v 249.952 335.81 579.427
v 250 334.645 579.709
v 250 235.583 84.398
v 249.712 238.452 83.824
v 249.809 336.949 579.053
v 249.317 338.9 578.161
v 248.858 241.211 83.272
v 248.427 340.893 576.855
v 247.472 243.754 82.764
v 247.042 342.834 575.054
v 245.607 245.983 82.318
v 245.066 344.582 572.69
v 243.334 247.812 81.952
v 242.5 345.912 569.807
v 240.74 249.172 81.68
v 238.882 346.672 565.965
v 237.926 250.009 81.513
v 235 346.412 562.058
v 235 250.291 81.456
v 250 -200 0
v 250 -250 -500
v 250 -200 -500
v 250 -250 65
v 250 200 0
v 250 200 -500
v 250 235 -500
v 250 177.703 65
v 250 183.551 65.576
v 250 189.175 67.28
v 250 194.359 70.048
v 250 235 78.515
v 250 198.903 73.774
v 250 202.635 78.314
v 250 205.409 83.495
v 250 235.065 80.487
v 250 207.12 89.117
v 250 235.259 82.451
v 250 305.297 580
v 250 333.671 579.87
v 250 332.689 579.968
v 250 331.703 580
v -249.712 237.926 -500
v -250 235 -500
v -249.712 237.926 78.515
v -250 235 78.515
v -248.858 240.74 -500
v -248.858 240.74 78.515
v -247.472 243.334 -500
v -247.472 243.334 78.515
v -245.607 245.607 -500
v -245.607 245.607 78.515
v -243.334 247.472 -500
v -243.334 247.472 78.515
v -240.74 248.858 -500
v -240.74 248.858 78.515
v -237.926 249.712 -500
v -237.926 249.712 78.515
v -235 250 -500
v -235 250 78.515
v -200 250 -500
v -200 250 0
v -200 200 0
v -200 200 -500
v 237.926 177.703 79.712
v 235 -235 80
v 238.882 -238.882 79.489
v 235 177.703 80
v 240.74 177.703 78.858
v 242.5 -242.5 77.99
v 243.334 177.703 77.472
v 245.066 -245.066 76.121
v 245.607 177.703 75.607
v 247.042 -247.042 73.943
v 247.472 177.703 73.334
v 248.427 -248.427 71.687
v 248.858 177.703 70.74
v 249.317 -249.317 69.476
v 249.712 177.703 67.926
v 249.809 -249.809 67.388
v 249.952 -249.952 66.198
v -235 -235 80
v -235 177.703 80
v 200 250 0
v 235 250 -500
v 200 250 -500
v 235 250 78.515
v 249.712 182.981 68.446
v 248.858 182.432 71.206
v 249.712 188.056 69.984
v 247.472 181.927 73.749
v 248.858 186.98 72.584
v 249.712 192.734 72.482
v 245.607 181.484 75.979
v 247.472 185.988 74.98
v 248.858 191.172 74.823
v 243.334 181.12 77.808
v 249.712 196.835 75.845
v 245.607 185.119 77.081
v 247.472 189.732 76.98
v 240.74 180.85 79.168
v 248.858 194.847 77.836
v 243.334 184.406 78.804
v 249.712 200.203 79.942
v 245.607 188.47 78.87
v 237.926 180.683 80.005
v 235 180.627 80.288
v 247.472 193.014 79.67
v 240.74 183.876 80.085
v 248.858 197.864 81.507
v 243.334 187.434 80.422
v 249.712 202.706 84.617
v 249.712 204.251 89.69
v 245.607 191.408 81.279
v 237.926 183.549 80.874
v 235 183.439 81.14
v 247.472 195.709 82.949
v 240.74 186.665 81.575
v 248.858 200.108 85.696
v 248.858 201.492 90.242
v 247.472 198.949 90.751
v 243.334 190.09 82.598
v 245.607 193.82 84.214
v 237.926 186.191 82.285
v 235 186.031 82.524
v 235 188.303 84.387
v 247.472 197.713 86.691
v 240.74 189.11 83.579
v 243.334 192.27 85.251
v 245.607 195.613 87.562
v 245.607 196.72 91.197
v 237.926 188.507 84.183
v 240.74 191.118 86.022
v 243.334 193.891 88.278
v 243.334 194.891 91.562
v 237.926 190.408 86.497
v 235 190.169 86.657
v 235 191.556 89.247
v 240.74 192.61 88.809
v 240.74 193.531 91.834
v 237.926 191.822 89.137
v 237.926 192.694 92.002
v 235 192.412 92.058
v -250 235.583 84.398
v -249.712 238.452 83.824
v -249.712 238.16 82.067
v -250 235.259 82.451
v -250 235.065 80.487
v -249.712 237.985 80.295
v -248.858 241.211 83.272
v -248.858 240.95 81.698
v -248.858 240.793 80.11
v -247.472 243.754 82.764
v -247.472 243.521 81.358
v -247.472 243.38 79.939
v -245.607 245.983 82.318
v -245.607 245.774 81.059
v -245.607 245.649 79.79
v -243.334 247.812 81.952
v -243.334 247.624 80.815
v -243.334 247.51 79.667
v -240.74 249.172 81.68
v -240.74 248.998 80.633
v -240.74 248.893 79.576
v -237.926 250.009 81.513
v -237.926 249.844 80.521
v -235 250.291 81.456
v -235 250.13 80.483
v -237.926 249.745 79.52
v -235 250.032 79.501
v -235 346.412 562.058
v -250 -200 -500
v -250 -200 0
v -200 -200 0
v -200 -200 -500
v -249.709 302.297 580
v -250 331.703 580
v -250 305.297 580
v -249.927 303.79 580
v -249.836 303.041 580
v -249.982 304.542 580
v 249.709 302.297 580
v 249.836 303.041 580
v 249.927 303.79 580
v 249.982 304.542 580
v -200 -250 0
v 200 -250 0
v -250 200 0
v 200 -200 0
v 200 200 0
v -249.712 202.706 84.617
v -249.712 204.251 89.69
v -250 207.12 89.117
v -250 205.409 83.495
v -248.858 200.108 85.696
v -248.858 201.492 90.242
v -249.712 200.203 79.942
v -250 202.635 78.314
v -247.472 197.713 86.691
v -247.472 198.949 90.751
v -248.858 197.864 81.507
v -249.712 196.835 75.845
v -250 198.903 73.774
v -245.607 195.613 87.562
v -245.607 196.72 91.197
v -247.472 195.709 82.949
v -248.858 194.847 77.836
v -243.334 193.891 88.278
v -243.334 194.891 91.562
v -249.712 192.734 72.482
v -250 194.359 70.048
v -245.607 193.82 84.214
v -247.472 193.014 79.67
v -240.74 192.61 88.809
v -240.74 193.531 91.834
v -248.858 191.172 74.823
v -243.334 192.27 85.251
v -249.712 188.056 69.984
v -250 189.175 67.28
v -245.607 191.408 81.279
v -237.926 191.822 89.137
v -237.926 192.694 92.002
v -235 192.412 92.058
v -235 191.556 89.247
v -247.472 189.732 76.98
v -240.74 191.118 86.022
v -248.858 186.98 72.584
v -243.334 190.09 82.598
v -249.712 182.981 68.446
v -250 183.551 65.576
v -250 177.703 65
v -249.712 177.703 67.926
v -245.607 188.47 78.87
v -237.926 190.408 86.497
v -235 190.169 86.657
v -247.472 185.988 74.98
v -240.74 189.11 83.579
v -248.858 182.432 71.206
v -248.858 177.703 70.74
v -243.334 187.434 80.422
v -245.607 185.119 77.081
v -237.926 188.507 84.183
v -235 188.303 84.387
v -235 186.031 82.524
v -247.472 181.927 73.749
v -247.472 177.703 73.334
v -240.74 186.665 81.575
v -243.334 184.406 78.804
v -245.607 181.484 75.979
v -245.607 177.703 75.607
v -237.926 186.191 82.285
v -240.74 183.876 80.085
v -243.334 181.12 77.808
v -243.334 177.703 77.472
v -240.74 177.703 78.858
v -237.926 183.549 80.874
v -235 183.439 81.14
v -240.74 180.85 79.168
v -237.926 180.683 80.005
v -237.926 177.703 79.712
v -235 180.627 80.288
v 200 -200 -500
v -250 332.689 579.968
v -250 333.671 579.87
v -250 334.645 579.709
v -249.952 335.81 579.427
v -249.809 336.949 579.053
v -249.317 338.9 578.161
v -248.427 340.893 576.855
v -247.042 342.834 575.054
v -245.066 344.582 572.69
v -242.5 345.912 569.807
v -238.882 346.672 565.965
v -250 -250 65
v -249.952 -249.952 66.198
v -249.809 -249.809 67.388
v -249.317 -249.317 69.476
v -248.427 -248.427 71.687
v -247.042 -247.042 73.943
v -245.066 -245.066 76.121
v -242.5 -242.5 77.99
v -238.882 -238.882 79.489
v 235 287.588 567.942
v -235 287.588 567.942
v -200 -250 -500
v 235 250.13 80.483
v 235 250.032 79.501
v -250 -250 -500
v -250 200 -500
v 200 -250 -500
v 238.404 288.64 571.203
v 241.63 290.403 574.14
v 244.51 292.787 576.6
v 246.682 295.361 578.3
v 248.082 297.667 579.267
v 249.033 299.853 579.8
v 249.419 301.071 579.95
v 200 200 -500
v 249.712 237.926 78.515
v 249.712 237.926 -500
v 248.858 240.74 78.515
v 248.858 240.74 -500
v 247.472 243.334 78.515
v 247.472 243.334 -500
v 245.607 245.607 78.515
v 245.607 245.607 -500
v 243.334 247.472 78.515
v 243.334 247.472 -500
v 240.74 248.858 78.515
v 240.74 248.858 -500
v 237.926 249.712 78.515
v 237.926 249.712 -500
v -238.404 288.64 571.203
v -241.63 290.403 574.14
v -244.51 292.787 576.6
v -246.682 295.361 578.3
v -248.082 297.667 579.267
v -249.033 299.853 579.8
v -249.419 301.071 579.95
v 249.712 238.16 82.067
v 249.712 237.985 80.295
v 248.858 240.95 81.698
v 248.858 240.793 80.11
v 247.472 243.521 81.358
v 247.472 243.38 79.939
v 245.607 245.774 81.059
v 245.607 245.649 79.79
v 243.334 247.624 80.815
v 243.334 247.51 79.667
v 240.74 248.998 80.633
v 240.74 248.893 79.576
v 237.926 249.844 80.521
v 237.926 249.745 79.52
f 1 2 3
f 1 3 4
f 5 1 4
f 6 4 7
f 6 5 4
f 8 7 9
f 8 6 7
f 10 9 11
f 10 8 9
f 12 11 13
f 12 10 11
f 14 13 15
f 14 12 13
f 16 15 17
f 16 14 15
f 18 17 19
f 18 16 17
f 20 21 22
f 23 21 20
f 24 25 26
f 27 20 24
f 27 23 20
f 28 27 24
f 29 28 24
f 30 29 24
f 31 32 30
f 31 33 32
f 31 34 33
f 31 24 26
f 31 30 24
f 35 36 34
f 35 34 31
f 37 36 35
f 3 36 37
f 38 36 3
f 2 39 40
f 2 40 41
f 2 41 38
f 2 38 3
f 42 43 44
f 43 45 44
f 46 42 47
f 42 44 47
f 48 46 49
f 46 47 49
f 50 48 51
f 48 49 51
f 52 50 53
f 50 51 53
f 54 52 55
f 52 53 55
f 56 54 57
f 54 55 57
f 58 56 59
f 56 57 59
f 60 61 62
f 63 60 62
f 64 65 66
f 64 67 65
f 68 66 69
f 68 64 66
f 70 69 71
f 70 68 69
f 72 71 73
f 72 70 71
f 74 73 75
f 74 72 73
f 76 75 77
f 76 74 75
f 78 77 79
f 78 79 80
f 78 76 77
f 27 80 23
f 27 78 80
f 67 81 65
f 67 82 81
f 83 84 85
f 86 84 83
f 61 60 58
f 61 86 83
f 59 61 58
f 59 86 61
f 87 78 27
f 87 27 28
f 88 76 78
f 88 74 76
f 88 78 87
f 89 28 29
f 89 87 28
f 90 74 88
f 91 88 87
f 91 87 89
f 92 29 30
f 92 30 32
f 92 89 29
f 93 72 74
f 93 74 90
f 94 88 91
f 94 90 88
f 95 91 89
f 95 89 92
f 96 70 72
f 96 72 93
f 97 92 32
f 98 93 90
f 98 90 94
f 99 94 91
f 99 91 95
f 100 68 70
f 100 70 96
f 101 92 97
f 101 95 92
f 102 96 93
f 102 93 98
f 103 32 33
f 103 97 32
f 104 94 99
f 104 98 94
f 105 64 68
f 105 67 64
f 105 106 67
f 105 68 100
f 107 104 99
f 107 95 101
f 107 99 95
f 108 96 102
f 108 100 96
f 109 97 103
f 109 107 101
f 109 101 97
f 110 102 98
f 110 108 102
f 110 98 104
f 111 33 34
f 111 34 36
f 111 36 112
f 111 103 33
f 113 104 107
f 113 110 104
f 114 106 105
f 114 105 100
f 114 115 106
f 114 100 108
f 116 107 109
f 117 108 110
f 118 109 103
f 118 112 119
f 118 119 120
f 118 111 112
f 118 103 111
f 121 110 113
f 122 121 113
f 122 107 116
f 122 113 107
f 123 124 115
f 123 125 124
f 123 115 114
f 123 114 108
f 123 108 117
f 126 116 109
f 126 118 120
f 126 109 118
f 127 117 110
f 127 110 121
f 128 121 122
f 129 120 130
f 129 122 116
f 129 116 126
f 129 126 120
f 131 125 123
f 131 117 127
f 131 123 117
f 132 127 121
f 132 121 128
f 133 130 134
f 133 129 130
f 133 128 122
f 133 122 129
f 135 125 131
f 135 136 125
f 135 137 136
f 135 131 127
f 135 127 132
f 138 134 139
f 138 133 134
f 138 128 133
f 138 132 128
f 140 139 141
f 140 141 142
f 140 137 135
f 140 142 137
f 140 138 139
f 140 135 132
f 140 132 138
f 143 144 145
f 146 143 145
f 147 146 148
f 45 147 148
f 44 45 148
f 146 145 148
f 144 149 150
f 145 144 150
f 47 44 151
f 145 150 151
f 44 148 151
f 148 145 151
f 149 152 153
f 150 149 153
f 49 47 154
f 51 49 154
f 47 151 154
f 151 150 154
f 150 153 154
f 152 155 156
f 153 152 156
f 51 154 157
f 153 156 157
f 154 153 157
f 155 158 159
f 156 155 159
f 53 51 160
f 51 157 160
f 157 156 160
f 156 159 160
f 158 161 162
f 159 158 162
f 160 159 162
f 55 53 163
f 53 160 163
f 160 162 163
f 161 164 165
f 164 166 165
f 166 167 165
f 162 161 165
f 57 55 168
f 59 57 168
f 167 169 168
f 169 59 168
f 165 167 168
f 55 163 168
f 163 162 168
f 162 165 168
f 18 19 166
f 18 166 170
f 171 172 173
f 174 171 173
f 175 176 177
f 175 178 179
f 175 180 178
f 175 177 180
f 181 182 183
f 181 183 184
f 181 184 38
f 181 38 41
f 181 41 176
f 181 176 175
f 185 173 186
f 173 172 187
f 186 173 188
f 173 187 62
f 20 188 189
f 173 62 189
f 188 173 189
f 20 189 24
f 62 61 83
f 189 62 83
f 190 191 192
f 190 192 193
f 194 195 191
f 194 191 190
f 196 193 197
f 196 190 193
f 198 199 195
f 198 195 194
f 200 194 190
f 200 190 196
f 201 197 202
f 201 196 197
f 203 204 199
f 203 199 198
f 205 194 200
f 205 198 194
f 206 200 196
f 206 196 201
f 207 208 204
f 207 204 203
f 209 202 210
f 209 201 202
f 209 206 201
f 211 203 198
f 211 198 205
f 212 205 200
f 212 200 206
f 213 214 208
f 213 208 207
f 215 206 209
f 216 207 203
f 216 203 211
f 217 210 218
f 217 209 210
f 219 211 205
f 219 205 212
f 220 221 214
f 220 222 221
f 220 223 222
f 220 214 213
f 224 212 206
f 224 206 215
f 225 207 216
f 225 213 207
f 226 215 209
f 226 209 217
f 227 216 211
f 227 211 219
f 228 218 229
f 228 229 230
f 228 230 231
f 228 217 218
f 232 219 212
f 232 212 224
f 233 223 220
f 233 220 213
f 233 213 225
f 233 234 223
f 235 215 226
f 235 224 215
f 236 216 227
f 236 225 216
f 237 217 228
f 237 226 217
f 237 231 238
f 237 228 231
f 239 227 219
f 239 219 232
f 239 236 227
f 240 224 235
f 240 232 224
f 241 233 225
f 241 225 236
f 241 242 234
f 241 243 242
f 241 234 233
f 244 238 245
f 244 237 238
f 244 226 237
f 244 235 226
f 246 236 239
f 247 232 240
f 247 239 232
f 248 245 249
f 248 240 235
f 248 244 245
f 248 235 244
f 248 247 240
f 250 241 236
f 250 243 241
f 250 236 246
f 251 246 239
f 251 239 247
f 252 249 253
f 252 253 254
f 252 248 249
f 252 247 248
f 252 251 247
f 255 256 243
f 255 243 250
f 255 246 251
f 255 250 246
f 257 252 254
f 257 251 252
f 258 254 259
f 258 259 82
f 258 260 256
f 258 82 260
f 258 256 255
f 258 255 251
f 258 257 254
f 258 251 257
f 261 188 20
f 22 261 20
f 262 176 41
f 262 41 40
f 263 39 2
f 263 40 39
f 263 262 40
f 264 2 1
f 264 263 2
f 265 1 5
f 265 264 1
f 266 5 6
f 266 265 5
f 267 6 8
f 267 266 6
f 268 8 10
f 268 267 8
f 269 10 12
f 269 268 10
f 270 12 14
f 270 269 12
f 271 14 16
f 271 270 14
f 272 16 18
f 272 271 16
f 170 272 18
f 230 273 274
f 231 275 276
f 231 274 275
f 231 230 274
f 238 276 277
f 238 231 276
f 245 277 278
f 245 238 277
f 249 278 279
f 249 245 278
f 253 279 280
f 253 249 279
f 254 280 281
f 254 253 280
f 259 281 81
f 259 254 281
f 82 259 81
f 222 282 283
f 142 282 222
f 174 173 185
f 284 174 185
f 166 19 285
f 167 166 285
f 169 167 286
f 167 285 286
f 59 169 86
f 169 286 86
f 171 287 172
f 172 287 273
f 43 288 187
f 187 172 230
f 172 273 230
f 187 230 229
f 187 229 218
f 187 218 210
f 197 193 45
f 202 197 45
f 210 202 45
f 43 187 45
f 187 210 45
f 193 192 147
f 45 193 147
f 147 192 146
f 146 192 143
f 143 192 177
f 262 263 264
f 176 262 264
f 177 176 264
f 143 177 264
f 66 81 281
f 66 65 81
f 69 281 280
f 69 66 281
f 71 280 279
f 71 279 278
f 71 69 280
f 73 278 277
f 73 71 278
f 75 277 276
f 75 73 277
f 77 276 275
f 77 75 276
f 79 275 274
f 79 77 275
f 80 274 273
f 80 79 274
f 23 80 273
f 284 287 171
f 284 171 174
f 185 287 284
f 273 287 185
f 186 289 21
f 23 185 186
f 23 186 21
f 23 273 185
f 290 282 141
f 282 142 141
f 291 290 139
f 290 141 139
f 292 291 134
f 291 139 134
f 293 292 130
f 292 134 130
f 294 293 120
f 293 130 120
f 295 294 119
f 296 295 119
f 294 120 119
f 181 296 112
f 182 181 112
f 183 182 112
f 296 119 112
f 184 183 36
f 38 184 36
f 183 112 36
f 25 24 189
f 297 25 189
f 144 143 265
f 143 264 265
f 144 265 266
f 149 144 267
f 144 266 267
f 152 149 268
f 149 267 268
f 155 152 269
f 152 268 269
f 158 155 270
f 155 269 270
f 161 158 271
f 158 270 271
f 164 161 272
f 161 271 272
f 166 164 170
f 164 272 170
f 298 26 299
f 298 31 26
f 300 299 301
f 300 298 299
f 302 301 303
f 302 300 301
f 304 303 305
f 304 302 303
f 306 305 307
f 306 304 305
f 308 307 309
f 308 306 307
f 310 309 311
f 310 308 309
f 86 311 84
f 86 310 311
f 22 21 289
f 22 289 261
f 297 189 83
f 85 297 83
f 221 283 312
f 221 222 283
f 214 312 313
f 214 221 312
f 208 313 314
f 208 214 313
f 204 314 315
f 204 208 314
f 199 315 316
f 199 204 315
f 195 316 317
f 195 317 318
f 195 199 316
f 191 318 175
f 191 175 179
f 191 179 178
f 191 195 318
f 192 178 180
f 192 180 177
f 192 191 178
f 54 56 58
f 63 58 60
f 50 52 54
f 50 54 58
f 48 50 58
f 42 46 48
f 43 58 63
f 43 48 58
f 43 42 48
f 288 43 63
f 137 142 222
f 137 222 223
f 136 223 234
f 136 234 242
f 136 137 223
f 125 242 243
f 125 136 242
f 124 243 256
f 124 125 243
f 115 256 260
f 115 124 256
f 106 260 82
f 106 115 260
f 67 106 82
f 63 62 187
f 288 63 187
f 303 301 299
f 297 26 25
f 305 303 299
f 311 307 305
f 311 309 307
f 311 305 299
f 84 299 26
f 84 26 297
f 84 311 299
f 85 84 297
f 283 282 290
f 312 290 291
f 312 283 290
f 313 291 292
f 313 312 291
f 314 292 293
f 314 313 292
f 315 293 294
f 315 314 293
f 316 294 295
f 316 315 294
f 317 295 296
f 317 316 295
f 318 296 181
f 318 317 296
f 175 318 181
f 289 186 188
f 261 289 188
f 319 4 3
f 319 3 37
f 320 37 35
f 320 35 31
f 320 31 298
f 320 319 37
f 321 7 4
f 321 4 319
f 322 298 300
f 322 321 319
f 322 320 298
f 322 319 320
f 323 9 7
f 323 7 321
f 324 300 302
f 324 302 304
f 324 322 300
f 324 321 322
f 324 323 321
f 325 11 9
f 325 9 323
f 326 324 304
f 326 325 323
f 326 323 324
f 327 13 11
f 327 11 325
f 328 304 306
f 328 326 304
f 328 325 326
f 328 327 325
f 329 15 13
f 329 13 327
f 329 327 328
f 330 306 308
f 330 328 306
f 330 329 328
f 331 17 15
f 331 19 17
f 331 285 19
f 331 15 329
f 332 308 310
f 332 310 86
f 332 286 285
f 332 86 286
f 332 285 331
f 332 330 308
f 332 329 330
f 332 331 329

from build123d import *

# Parameters (mm, degrees)
F0_W            = 500
F0_H            = 500
F1_DEPTH        = 80
F2_W            = 50
F2_H            = 50
F3_DEPTH        = 500
F3_COPIES_COUNT = 4
F6_DEPTH        = 250
F7_R            = 15


# Not quite as in the source:
# - a pattern or mirror of a feature is missing from the dataset's text; its kind, count and spacing are read off the source's solid


with BuildPart() as f1:
    # F0 (on Top) → F1 (new body)
    with BuildSketch(Plane.XY):
        Rectangle(F0_W, F0_H)
    extrude(amount=F1_DEPTH)

    # F2 (on face) → F3 (join)
    with BuildSketch(Plane(origin=(0, 0, 0), x_dir=(1, 0, 0), z_dir=(0, 0, -1))):
        with Locations((-225, 225)):
            Rectangle(F2_W, F2_H)
    f3 = extrude(amount=F3_DEPTH)

    # F3_copies: F3 ×4 about axis
    f3_copies_axis = Axis((0, 0, 0), (0, 0, 1))
    for i in range(1, F3_COPIES_COUNT):
        add(f3.rotate(f3_copies_axis, i * 360 / F3_COPIES_COUNT))

    # F5 (on Right) → F6 (join, symmetric)
    with BuildSketch(Plane.YZ):
        Polygon((290, 580), (190, 80), (250, 80), (350, 580), align=None)
    extrude(amount=F6_DEPTH, both=True)

    # F7
    f7_edges = [f1.edges().sort_by_distance(p)[0] for p in [
        (0, -250, 80),
        (-250, -30, 80),
        (0, 190, 80),
        (250, -30, 80),
        (-250, 240, 330),
        (250, 240, 330),
        (0, 290, 580),
        (0, 250, 80),
        (-250, 300, 330),
        (0, 350, 580),
        (250, 300, 330),
        (250, 250, -210),
        (-250, 250, -210),
    ]]
    fillet(f7_edges, radius=F7_R)


solid = f1.part
